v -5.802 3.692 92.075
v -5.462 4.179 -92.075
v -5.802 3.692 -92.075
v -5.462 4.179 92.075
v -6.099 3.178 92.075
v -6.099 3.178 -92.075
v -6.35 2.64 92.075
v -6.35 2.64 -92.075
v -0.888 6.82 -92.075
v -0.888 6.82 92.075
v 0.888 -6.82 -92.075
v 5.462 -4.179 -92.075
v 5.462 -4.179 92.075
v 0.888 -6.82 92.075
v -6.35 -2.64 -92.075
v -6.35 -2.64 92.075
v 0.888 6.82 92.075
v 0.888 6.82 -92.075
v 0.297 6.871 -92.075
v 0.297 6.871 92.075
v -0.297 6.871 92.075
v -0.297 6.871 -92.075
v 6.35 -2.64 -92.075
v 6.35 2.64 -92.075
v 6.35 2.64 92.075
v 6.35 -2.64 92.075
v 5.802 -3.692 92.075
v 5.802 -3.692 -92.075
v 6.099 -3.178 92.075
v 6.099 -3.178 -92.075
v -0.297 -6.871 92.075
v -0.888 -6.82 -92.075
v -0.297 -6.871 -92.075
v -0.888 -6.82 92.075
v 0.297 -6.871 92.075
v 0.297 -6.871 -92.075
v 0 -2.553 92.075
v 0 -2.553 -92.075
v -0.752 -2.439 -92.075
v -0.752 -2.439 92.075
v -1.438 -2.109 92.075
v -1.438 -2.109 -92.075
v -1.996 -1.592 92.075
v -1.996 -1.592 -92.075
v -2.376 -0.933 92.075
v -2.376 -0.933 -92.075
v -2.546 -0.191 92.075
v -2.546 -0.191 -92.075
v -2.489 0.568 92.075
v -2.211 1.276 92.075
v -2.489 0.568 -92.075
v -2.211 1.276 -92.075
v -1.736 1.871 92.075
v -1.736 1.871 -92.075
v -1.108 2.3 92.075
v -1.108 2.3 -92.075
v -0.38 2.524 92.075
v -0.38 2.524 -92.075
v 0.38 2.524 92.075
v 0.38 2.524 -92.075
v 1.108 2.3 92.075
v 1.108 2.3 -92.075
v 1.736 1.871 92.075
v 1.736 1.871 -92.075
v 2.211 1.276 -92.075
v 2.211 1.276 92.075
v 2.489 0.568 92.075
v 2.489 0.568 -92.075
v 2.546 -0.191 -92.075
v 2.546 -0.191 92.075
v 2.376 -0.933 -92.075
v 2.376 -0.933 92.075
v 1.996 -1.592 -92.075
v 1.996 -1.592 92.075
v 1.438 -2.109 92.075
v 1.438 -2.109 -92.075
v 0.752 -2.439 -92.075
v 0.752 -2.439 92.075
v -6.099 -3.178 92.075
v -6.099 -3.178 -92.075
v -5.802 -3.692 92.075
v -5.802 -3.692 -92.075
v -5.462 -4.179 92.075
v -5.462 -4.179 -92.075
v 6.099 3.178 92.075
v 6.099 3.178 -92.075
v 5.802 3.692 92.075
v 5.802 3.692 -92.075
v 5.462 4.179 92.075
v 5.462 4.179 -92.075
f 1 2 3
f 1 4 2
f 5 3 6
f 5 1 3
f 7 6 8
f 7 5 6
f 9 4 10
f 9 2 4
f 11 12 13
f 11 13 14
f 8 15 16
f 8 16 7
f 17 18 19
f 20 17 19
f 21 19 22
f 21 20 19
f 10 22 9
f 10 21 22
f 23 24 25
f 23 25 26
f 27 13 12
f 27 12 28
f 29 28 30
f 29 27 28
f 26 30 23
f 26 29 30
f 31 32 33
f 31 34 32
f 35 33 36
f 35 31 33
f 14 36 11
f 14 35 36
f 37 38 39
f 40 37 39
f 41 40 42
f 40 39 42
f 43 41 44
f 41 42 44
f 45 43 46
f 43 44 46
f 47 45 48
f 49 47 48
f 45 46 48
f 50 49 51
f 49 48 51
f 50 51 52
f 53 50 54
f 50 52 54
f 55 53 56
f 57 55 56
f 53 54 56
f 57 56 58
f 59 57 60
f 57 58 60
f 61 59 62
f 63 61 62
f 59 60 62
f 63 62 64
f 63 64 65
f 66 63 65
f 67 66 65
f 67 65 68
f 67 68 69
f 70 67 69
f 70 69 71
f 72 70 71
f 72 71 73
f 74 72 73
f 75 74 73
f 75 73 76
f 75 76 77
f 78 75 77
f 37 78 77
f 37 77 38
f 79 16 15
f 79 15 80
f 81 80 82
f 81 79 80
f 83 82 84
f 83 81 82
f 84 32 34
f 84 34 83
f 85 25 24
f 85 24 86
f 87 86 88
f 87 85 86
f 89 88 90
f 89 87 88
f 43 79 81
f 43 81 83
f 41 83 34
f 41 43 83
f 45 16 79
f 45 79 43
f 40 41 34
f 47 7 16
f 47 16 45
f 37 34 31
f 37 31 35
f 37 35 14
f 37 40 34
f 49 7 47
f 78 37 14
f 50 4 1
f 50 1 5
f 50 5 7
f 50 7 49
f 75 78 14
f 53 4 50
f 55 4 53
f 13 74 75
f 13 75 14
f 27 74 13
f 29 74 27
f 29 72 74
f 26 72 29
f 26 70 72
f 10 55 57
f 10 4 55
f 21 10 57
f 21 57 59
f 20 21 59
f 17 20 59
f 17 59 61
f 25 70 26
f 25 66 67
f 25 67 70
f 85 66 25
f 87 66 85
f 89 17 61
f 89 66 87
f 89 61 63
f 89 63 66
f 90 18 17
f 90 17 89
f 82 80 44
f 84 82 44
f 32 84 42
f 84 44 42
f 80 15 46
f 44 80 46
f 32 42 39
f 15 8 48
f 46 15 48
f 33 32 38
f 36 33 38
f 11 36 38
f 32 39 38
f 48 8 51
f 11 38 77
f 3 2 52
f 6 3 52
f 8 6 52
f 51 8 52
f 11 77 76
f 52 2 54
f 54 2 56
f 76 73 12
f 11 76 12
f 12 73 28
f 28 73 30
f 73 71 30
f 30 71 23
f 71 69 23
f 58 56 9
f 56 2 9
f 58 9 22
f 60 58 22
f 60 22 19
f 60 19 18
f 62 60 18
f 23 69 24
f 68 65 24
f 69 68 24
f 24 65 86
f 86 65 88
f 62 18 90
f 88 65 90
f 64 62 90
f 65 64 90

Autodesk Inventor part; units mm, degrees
ref_plane "YZ Plane" through (0, 0, 0) normal (1, 0, 0) x (0, 1, 0)
ref_plane "XZ Plane" through (0, 0, 0) normal (0, 1, 0) x (-1, 0, 0)
ref_plane "XY Plane" through (0, 0, 0) normal (0, 0, 1) x (1, 0, 0)
sketch "Sketch1" plane through (0, 0, 0) normal (0, 0, 1) x (1, 0, 0)
  line L0 (-6.35, -3.6662) -> (-6.35, 3.6662)
  line L1 (-6.35, 3.6662) -> (0, 7.3323)
  line L2 (0, 7.3323) -> (6.35, 3.6662)
  line L3 (6.35, 3.6662) -> (6.35, -3.6662)
  line L4 (6.35, -3.6662) -> (0, -7.3323)
  line L5 (0, -7.3323) -> (-6.35, -3.6662)
  point P0 (0, 0)
  point P1 (0, 0)
  dimension "Size" = 12.7
extrude "Extrusion1" add sketch "Sketch1" along normal mid plane 184.15
sketch "Sketch3" plane through (0, 0, 92.075) normal (0, 0, 1) x (1, 0, 0)
  line L0 (-6.35, 3.6662) -> (0, 7.3323) construction
  line L1 (0, 7.3323) -> (6.35, 3.6662) construction
  line L2 (6.35, 3.6662) -> (6.35, -3.6662) construction
  line L3 (6.35, -3.6662) -> (0, -7.3323) construction
  line L4 (0, -7.3323) -> (-6.35, -3.6662) construction
  line L5 (-6.35, -3.6662) -> (-6.35, 3.6662) construction
  point P0 (0, 0)
hole "Hole1" at (0, 0, 92.075) direction (0, 0, -1) diameter 5.1054 end through all
sketch "Sketch4" plane through (0, 0, 92.075) normal (0, 0, 1) x (1, 0, 0)
  circle A0 centre (0, 0) radius 2.5527 construction
  line L0 (-6.35, 3.6662) -> (0, 7.3323) construction
  line L1 (0, 7.3323) -> (6.35, 3.6662) construction
  line L2 (6.35, 3.6662) -> (6.35, -3.6662) construction
  line L3 (6.35, -3.6662) -> (0, -7.3323) construction
  line L4 (0, -7.3323) -> (-6.35, -3.6662) construction
  line L5 (-6.35, -3.6662) -> (-6.35, 3.6662) construction
  circle A1 centre (0, 0) radius 6.8771
  circle A2 centre (0, 0) radius 8.89
  dimension "thunder" = 13.7541
  dimension "d16" = 17.78
extrude "Extrusion3" cut sketch "Sketch4" against normal through all
equation "\"bearing\" = 25.4"
properties part number "GP5-024" material "Aluminum 6061"
